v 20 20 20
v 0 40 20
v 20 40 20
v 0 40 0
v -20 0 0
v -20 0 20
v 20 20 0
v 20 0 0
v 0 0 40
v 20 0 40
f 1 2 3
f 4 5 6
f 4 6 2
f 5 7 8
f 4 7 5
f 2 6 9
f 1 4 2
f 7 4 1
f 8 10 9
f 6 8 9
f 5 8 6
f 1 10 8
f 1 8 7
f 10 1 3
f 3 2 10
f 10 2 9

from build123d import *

# Parameters (mm, degrees)
SKETCH1_W           = 20
SKETCH1_H           = 40
BOSS_EXTRUDE1_DEPTH = 40
BOSS_EXTRUDE2_DEPTH = 20
CUT_EXTRUDE1_DEPTH  = 20
CUT_EXTRUDE2_DEPTH  = 20
BOSS_EXTRUDE3_DEPTH = 20
SKETCH6_W           = 20
SKETCH6_H           = 28.284271247
CUT_EXTRUDE3_DEPTH  = 20
SKETCH7_W           = 40
SKETCH7_H           = 40
CUT_EXTRUDE4_DEPTH  = 20


with BuildPart() as part:
    # Sketch1 → Boss-Extrude1 (new body)
    with BuildSketch(Plane.XY):
        with Locations((10, 20)):
            Rectangle(SKETCH1_W, SKETCH1_H)
    extrude(amount=BOSS_EXTRUDE1_DEPTH)

    # Sketch2 → Boss-Extrude2 (add)
    with BuildSketch(Plane(origin=(0, 0, 0), x_dir=(-1, 0, 0), z_dir=(0, 0, -1))):
        Polygon((0, 0), (20, 0), (0, 40), align=None)
    extrude(amount=-BOSS_EXTRUDE2_DEPTH)

    # Sketch3 → Cut-Extrude1 (cut)
    with BuildSketch(Plane(origin=(0, 0, 0), x_dir=(-1, 0, 0), z_dir=(0, 0, -1))):
        Polygon((0, 40), (-20, 20), (-20, 40), align=None)
    extrude(amount=-CUT_EXTRUDE1_DEPTH, mode=Mode.SUBTRACT)

    # Sketch4 → Cut-Extrude2 (cut)
    with BuildSketch(Plane.ZY):
        Polygon((20, 40), (40, 0), (40, 40), align=None)
    extrude(amount=-CUT_EXTRUDE2_DEPTH, mode=Mode.SUBTRACT)

    # Sketch5 → Boss-Extrude3 (add)
    with BuildSketch(Plane(origin=(-17.777777778, 8.888888889, 17.777777778), x_dir=(-0.745355992, -0.298142397, -0.596284794), z_dir=(0.666666667, -0.333333333, -0.666666667))):
        Polygon((-23.85139176, 26.83281573), (2.98142397, -8.94427191), (-23.85139176, -17.88854382), align=None)
    extrude(amount=BOSS_EXTRUDE3_DEPTH)

    # Sketch6 → Cut-Extrude3 (cut)
    with BuildSketch(Plane(origin=(20, 20, 0), x_dir=(0, 0, -1), z_dir=(0.707106781, 0.707106781, 0))):
        with Locations((-10, 14.142135624)):
            Rectangle(SKETCH6_W, SKETCH6_H)
    extrude(amount=CUT_EXTRUDE3_DEPTH, mode=Mode.SUBTRACT)

    # Sketch7 → Cut-Extrude4 (cut)
    with BuildSketch(Plane.XZ):
        with Locations((0, 20)):
            Rectangle(SKETCH7_W, SKETCH7_H)
    extrude(amount=CUT_EXTRUDE4_DEPTH, mode=Mode.SUBTRACT)


solid = part.part
